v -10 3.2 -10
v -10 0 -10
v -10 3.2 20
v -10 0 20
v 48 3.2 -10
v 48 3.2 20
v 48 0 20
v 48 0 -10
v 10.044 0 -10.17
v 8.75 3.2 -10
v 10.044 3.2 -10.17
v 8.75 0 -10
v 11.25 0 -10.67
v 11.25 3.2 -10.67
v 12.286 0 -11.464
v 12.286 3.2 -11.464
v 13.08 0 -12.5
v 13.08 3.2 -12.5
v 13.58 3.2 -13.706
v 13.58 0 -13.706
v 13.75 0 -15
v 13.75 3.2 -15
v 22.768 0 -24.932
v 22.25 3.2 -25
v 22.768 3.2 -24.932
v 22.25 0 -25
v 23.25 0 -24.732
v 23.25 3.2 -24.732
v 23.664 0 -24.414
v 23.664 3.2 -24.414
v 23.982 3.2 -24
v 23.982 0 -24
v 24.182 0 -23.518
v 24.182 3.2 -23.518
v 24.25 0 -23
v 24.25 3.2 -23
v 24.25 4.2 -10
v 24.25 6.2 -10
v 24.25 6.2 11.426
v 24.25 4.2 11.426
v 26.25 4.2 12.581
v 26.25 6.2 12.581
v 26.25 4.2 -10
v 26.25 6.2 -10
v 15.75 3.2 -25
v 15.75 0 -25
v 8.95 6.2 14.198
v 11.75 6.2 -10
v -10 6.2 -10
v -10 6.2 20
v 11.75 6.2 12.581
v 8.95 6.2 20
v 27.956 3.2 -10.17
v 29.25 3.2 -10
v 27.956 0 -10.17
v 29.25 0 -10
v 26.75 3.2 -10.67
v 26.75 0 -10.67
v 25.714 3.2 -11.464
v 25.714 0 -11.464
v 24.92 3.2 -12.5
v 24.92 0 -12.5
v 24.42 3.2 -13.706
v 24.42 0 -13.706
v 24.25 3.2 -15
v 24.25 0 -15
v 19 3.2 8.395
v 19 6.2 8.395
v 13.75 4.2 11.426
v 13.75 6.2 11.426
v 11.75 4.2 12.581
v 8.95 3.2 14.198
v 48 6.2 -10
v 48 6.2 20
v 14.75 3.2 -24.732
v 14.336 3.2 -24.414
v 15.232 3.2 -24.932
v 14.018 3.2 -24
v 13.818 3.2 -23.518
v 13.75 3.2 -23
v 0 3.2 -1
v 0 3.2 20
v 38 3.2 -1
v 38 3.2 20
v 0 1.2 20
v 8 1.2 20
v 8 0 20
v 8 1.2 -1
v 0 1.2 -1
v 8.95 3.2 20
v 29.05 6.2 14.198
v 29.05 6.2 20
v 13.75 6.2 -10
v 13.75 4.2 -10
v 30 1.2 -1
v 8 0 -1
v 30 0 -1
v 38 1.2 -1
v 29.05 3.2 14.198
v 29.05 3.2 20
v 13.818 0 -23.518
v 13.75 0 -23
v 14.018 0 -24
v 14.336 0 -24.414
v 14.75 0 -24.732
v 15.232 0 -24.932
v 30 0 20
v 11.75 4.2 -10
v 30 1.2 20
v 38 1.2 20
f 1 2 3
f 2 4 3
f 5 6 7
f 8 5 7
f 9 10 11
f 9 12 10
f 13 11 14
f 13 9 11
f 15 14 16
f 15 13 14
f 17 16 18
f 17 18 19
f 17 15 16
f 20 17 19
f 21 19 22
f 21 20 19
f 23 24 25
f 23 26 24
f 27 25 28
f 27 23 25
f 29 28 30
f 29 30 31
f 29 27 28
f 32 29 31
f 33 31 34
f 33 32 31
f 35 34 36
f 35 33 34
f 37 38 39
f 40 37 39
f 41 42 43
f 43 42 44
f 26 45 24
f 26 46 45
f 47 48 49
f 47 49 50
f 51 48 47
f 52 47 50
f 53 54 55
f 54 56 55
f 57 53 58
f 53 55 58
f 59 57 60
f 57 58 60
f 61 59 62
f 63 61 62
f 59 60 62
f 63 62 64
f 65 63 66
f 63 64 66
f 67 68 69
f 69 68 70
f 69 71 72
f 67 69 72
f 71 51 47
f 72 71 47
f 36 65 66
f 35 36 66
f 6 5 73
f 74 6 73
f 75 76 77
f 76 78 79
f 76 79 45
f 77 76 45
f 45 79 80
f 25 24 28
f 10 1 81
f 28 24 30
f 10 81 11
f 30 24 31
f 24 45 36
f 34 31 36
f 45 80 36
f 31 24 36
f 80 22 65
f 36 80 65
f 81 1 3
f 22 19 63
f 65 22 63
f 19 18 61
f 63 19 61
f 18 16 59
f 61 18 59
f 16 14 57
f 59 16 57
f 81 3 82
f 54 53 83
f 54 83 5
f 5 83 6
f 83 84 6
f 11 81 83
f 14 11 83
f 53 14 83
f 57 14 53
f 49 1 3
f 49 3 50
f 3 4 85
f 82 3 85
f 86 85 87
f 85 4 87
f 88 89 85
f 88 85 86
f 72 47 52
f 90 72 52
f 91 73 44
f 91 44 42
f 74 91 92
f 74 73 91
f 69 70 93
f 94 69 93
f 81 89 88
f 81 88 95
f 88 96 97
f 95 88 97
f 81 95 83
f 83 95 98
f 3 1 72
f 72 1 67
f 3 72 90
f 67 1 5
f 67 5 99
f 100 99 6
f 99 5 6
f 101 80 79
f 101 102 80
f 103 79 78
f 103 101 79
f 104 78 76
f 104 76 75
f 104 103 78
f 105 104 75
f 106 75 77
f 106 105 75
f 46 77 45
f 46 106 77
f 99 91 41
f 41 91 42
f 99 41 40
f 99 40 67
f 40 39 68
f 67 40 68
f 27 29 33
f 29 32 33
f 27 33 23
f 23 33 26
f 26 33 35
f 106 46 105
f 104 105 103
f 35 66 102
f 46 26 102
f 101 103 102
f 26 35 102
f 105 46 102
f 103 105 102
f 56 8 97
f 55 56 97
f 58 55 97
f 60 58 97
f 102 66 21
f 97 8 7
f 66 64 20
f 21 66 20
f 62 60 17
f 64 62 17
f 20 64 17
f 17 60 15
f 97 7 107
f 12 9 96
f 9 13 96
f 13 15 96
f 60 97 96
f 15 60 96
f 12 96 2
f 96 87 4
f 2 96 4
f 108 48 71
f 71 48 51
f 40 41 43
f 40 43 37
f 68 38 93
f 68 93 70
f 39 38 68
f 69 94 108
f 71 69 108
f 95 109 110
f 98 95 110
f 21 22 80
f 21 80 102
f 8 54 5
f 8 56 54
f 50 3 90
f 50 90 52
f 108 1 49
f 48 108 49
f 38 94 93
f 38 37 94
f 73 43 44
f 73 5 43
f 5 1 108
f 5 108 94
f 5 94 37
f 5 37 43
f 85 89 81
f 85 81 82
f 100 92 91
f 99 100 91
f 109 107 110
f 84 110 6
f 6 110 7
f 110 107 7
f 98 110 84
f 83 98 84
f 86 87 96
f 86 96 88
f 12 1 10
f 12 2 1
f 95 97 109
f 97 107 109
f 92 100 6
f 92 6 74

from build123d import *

# Parameters (mm, degrees)
F0_W      = 38
F0_H      = 1.2
F1_DEPTH  = 20
F3_W      = 10
F3_H      = 20
F4_DEPTH  = 3.2
F5_W      = 10
F5_H      = 20
F6_DEPTH  = 3.2
F7_W      = 38
F7_H      = 2
F8_DEPTH  = 10
F2_W      = 22
F2_H      = 1.2
F9_DEPTH  = 20
F10_W     = 3
F10_H     = 30
F11_DEPTH = 58
F13_DEPTH = 6.201
F15_DEPTH = 2
F16_W     = 10.5
F16_H     = 3.2
F17_DEPTH = 15
F18_R     = 5
F19_R     = 2
F20_DEPTH = 1


with BuildPart() as f1:
    # F0 (on Top) → F1 (new body)
    with BuildSketch(Plane.XY):
        with Locations((19, 0.6)):
            Rectangle(F0_W, F0_H)
    extrude(amount=F1_DEPTH)

    # F3 (on face) → F4 (join)
    with BuildSketch(Plane.XZ):
        with Locations((-5, 10)):
            Rectangle(F3_W, F3_H)
    extrude(amount=-F4_DEPTH)

    # F5 (on face) → F6 (join)
    with BuildSketch(Plane.XZ):
        with Locations((43, 10)):
            Rectangle(F5_W, F5_H)
    extrude(amount=-F6_DEPTH)

    # F7 (on face) → F8 (join)
    with BuildSketch(Plane(origin=(0, 0, 0), x_dir=(1, 0, 0), z_dir=(0, 0, -1))):
        with Locations((19, -2.2)):
            Rectangle(F7_W, F7_H)
        Polygon((48, -3.2), (48, 0), (-10, 0), (-10, -3.2), (0, -3.2), (0, -1.2), (38, -1.2), (38, -3.2), align=None)
    extrude(amount=F8_DEPTH)

    # F2 (on face) → F9 (cut)
    with BuildSketch(Plane.XY.offset(20)):
        with Locations((19, 0.6)):
            Rectangle(F2_W, F2_H)
    extrude(amount=-F9_DEPTH, mode=Mode.SUBTRACT)

    # F16 (on face) → F17 (join)
    with BuildSketch(Plane(origin=(0, 0, -10), x_dir=(1, 0, 0), z_dir=(0, 0, -1))):
        with Locations((19, -1.6)):
            Rectangle(F16_W, F16_H)
    extrude(amount=F17_DEPTH)

    # F18
    f18_edges = [f1.edges().sort_by_distance(p)[0] for p in [
        (24.25, 1.6, -10),
        (13.75, 1.6, -10),
    ]]
    fillet(f18_edges, radius=F18_R)

    # F19
    f19_edges = [f1.edges().sort_by_distance(p)[0] for p in [
        (24.25, 1.6, -25),
        (13.75, 1.6, -25),
    ]]
    fillet(f19_edges, radius=F19_R)

    # F20 (cut): a face of the model
    f20_faces = [f1.faces().sort_by_distance(p)[0] for p in [
        (19, 1.7875, 0),
    ]]
    extrude(f20_faces, amount=-F20_DEPTH, mode=Mode.SUBTRACT)


with BuildPart() as f11:
    # F10 (on face) → F11 (new body)
    with BuildSketch(Plane.YZ.offset(48)):
        with Locations((4.7, 5)):
            Rectangle(F10_W, F10_H)
    extrude(amount=-F11_DEPTH)

    # F12 (on face) → F13 (cut, through all)
    with BuildSketch(Plane(origin=(0, 6.2, 0), x_dir=(-1, 0, 0), z_dir=(0, 1, 0))):
        Polygon((-29.05, 20), (-29.05, 14.1976297946), (-19, 8.3952595893), (-8.95, 14.1976297946), (-8.95, 20), align=None)
    extrude(amount=-F13_DEPTH, mode=Mode.SUBTRACT)

    # F14 (on face) → F15 (cut)
    with BuildSketch(Plane(origin=(0, 6.2, 0), x_dir=(-1, 0, 0), z_dir=(0, 1, 0))):
        Polygon((-24.25, 11.1954083949), (-26.25, 12.3501089332), (-26.25, -16.1530785263), (-24.25, -16.2737797946), align=None)
        Polygon((-26.25, 13.1725249812), (-26.25, 12.3501089332), (-24.25, 11.1954083949), (-24.25, 13.1725249812), align=None)
        Polygon((-11.75, -16.6962388903), (-11.75, 12.3501089332), (-11.75, 12.5810490409), (-13.75, 12.8753753379), (-13.75, 11.1954083949), (-13.75, -16.0927250981), align=None)
    extrude(amount=-F15_DEPTH, mode=Mode.SUBTRACT)


solid = Compound([f1.part, f11.part])
